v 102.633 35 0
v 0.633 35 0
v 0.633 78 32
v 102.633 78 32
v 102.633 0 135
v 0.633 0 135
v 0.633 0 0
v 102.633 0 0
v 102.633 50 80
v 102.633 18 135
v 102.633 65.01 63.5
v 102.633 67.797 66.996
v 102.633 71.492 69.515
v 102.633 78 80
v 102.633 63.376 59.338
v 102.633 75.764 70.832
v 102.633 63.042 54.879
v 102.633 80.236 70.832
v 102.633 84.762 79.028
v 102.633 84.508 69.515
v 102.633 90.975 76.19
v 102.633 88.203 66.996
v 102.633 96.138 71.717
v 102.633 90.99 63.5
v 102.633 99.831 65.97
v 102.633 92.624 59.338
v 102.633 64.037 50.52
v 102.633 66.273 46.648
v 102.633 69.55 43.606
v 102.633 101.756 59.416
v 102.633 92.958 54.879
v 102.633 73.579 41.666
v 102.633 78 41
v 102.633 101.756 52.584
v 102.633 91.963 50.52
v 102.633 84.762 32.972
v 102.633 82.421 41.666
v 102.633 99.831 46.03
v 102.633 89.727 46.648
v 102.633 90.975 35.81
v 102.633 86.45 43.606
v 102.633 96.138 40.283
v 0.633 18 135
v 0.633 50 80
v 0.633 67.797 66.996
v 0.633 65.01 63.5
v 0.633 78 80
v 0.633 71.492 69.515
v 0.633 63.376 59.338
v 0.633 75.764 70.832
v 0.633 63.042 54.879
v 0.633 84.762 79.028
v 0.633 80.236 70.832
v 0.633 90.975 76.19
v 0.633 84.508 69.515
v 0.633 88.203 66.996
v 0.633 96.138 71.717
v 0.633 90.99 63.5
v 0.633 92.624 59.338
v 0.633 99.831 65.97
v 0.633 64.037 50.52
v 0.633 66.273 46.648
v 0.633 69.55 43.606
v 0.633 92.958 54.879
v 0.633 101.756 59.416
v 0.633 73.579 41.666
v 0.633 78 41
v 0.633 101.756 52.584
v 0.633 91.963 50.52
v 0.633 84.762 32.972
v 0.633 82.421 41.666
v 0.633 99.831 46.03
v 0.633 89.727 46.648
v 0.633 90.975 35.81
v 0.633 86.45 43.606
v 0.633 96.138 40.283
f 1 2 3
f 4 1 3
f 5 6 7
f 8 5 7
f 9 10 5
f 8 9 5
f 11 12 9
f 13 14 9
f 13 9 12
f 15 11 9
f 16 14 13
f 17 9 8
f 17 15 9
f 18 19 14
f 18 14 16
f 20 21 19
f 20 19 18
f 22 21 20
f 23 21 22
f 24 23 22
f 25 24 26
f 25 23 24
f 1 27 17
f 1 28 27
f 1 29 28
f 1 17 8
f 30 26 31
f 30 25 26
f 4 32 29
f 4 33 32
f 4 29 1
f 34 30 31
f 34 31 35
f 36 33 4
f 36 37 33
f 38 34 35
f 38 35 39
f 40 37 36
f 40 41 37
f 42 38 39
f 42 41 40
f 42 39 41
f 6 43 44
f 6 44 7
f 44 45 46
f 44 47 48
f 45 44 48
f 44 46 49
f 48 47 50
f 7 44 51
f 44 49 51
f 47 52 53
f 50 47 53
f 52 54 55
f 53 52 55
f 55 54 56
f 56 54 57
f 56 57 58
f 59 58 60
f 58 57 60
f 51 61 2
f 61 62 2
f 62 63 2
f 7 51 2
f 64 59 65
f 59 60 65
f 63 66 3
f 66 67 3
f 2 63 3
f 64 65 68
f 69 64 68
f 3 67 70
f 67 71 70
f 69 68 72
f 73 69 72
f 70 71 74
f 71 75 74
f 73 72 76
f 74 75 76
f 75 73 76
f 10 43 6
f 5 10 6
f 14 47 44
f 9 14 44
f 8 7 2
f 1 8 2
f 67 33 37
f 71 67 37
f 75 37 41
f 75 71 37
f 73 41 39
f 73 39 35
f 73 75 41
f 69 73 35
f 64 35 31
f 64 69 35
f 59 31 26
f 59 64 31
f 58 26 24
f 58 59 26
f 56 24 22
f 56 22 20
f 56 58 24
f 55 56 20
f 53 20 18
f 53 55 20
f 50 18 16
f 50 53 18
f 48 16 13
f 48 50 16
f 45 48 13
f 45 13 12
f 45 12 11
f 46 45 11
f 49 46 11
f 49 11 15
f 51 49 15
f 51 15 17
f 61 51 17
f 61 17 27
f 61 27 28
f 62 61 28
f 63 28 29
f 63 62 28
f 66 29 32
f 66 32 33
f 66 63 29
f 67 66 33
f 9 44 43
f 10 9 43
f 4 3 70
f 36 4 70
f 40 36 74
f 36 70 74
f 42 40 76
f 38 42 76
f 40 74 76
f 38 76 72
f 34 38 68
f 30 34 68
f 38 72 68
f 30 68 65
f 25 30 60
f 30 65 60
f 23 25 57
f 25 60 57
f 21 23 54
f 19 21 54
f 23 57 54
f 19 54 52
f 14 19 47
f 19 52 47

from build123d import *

# Parameters (mm, degrees)
EXTRUDE_START   = 0.633192
SKETCH_1_R      = 15
EXTRUDE_3_DEPTH = 102


with BuildPart() as part:
    # Эскиз1 → Бобышка-Вытянуть3 (new body)
    with BuildSketch(Plane(origin=(0, 0, 0), x_dir=(0, 0, -1), z_dir=(1, 0, 0)).offset(EXTRUDE_START)):
        with BuildLine():
            Line((0, 0), (0, 35))
            Line((0, 35), (-32, 78))
            ThreePointArc((-32, 78), (-56, 102), (-80, 78))
            Line((-80, 78), (-80, 50))
            Line((-80, 50), (-135, 18))
            Line((-135, 18), (-135, 0))
            Line((-135, 0), (0, 0))
        make_face()
        with Locations((-56, 78)):
            Circle(SKETCH_1_R, mode=Mode.SUBTRACT)
    extrude(amount=EXTRUDE_3_DEPTH)


solid = part.part
